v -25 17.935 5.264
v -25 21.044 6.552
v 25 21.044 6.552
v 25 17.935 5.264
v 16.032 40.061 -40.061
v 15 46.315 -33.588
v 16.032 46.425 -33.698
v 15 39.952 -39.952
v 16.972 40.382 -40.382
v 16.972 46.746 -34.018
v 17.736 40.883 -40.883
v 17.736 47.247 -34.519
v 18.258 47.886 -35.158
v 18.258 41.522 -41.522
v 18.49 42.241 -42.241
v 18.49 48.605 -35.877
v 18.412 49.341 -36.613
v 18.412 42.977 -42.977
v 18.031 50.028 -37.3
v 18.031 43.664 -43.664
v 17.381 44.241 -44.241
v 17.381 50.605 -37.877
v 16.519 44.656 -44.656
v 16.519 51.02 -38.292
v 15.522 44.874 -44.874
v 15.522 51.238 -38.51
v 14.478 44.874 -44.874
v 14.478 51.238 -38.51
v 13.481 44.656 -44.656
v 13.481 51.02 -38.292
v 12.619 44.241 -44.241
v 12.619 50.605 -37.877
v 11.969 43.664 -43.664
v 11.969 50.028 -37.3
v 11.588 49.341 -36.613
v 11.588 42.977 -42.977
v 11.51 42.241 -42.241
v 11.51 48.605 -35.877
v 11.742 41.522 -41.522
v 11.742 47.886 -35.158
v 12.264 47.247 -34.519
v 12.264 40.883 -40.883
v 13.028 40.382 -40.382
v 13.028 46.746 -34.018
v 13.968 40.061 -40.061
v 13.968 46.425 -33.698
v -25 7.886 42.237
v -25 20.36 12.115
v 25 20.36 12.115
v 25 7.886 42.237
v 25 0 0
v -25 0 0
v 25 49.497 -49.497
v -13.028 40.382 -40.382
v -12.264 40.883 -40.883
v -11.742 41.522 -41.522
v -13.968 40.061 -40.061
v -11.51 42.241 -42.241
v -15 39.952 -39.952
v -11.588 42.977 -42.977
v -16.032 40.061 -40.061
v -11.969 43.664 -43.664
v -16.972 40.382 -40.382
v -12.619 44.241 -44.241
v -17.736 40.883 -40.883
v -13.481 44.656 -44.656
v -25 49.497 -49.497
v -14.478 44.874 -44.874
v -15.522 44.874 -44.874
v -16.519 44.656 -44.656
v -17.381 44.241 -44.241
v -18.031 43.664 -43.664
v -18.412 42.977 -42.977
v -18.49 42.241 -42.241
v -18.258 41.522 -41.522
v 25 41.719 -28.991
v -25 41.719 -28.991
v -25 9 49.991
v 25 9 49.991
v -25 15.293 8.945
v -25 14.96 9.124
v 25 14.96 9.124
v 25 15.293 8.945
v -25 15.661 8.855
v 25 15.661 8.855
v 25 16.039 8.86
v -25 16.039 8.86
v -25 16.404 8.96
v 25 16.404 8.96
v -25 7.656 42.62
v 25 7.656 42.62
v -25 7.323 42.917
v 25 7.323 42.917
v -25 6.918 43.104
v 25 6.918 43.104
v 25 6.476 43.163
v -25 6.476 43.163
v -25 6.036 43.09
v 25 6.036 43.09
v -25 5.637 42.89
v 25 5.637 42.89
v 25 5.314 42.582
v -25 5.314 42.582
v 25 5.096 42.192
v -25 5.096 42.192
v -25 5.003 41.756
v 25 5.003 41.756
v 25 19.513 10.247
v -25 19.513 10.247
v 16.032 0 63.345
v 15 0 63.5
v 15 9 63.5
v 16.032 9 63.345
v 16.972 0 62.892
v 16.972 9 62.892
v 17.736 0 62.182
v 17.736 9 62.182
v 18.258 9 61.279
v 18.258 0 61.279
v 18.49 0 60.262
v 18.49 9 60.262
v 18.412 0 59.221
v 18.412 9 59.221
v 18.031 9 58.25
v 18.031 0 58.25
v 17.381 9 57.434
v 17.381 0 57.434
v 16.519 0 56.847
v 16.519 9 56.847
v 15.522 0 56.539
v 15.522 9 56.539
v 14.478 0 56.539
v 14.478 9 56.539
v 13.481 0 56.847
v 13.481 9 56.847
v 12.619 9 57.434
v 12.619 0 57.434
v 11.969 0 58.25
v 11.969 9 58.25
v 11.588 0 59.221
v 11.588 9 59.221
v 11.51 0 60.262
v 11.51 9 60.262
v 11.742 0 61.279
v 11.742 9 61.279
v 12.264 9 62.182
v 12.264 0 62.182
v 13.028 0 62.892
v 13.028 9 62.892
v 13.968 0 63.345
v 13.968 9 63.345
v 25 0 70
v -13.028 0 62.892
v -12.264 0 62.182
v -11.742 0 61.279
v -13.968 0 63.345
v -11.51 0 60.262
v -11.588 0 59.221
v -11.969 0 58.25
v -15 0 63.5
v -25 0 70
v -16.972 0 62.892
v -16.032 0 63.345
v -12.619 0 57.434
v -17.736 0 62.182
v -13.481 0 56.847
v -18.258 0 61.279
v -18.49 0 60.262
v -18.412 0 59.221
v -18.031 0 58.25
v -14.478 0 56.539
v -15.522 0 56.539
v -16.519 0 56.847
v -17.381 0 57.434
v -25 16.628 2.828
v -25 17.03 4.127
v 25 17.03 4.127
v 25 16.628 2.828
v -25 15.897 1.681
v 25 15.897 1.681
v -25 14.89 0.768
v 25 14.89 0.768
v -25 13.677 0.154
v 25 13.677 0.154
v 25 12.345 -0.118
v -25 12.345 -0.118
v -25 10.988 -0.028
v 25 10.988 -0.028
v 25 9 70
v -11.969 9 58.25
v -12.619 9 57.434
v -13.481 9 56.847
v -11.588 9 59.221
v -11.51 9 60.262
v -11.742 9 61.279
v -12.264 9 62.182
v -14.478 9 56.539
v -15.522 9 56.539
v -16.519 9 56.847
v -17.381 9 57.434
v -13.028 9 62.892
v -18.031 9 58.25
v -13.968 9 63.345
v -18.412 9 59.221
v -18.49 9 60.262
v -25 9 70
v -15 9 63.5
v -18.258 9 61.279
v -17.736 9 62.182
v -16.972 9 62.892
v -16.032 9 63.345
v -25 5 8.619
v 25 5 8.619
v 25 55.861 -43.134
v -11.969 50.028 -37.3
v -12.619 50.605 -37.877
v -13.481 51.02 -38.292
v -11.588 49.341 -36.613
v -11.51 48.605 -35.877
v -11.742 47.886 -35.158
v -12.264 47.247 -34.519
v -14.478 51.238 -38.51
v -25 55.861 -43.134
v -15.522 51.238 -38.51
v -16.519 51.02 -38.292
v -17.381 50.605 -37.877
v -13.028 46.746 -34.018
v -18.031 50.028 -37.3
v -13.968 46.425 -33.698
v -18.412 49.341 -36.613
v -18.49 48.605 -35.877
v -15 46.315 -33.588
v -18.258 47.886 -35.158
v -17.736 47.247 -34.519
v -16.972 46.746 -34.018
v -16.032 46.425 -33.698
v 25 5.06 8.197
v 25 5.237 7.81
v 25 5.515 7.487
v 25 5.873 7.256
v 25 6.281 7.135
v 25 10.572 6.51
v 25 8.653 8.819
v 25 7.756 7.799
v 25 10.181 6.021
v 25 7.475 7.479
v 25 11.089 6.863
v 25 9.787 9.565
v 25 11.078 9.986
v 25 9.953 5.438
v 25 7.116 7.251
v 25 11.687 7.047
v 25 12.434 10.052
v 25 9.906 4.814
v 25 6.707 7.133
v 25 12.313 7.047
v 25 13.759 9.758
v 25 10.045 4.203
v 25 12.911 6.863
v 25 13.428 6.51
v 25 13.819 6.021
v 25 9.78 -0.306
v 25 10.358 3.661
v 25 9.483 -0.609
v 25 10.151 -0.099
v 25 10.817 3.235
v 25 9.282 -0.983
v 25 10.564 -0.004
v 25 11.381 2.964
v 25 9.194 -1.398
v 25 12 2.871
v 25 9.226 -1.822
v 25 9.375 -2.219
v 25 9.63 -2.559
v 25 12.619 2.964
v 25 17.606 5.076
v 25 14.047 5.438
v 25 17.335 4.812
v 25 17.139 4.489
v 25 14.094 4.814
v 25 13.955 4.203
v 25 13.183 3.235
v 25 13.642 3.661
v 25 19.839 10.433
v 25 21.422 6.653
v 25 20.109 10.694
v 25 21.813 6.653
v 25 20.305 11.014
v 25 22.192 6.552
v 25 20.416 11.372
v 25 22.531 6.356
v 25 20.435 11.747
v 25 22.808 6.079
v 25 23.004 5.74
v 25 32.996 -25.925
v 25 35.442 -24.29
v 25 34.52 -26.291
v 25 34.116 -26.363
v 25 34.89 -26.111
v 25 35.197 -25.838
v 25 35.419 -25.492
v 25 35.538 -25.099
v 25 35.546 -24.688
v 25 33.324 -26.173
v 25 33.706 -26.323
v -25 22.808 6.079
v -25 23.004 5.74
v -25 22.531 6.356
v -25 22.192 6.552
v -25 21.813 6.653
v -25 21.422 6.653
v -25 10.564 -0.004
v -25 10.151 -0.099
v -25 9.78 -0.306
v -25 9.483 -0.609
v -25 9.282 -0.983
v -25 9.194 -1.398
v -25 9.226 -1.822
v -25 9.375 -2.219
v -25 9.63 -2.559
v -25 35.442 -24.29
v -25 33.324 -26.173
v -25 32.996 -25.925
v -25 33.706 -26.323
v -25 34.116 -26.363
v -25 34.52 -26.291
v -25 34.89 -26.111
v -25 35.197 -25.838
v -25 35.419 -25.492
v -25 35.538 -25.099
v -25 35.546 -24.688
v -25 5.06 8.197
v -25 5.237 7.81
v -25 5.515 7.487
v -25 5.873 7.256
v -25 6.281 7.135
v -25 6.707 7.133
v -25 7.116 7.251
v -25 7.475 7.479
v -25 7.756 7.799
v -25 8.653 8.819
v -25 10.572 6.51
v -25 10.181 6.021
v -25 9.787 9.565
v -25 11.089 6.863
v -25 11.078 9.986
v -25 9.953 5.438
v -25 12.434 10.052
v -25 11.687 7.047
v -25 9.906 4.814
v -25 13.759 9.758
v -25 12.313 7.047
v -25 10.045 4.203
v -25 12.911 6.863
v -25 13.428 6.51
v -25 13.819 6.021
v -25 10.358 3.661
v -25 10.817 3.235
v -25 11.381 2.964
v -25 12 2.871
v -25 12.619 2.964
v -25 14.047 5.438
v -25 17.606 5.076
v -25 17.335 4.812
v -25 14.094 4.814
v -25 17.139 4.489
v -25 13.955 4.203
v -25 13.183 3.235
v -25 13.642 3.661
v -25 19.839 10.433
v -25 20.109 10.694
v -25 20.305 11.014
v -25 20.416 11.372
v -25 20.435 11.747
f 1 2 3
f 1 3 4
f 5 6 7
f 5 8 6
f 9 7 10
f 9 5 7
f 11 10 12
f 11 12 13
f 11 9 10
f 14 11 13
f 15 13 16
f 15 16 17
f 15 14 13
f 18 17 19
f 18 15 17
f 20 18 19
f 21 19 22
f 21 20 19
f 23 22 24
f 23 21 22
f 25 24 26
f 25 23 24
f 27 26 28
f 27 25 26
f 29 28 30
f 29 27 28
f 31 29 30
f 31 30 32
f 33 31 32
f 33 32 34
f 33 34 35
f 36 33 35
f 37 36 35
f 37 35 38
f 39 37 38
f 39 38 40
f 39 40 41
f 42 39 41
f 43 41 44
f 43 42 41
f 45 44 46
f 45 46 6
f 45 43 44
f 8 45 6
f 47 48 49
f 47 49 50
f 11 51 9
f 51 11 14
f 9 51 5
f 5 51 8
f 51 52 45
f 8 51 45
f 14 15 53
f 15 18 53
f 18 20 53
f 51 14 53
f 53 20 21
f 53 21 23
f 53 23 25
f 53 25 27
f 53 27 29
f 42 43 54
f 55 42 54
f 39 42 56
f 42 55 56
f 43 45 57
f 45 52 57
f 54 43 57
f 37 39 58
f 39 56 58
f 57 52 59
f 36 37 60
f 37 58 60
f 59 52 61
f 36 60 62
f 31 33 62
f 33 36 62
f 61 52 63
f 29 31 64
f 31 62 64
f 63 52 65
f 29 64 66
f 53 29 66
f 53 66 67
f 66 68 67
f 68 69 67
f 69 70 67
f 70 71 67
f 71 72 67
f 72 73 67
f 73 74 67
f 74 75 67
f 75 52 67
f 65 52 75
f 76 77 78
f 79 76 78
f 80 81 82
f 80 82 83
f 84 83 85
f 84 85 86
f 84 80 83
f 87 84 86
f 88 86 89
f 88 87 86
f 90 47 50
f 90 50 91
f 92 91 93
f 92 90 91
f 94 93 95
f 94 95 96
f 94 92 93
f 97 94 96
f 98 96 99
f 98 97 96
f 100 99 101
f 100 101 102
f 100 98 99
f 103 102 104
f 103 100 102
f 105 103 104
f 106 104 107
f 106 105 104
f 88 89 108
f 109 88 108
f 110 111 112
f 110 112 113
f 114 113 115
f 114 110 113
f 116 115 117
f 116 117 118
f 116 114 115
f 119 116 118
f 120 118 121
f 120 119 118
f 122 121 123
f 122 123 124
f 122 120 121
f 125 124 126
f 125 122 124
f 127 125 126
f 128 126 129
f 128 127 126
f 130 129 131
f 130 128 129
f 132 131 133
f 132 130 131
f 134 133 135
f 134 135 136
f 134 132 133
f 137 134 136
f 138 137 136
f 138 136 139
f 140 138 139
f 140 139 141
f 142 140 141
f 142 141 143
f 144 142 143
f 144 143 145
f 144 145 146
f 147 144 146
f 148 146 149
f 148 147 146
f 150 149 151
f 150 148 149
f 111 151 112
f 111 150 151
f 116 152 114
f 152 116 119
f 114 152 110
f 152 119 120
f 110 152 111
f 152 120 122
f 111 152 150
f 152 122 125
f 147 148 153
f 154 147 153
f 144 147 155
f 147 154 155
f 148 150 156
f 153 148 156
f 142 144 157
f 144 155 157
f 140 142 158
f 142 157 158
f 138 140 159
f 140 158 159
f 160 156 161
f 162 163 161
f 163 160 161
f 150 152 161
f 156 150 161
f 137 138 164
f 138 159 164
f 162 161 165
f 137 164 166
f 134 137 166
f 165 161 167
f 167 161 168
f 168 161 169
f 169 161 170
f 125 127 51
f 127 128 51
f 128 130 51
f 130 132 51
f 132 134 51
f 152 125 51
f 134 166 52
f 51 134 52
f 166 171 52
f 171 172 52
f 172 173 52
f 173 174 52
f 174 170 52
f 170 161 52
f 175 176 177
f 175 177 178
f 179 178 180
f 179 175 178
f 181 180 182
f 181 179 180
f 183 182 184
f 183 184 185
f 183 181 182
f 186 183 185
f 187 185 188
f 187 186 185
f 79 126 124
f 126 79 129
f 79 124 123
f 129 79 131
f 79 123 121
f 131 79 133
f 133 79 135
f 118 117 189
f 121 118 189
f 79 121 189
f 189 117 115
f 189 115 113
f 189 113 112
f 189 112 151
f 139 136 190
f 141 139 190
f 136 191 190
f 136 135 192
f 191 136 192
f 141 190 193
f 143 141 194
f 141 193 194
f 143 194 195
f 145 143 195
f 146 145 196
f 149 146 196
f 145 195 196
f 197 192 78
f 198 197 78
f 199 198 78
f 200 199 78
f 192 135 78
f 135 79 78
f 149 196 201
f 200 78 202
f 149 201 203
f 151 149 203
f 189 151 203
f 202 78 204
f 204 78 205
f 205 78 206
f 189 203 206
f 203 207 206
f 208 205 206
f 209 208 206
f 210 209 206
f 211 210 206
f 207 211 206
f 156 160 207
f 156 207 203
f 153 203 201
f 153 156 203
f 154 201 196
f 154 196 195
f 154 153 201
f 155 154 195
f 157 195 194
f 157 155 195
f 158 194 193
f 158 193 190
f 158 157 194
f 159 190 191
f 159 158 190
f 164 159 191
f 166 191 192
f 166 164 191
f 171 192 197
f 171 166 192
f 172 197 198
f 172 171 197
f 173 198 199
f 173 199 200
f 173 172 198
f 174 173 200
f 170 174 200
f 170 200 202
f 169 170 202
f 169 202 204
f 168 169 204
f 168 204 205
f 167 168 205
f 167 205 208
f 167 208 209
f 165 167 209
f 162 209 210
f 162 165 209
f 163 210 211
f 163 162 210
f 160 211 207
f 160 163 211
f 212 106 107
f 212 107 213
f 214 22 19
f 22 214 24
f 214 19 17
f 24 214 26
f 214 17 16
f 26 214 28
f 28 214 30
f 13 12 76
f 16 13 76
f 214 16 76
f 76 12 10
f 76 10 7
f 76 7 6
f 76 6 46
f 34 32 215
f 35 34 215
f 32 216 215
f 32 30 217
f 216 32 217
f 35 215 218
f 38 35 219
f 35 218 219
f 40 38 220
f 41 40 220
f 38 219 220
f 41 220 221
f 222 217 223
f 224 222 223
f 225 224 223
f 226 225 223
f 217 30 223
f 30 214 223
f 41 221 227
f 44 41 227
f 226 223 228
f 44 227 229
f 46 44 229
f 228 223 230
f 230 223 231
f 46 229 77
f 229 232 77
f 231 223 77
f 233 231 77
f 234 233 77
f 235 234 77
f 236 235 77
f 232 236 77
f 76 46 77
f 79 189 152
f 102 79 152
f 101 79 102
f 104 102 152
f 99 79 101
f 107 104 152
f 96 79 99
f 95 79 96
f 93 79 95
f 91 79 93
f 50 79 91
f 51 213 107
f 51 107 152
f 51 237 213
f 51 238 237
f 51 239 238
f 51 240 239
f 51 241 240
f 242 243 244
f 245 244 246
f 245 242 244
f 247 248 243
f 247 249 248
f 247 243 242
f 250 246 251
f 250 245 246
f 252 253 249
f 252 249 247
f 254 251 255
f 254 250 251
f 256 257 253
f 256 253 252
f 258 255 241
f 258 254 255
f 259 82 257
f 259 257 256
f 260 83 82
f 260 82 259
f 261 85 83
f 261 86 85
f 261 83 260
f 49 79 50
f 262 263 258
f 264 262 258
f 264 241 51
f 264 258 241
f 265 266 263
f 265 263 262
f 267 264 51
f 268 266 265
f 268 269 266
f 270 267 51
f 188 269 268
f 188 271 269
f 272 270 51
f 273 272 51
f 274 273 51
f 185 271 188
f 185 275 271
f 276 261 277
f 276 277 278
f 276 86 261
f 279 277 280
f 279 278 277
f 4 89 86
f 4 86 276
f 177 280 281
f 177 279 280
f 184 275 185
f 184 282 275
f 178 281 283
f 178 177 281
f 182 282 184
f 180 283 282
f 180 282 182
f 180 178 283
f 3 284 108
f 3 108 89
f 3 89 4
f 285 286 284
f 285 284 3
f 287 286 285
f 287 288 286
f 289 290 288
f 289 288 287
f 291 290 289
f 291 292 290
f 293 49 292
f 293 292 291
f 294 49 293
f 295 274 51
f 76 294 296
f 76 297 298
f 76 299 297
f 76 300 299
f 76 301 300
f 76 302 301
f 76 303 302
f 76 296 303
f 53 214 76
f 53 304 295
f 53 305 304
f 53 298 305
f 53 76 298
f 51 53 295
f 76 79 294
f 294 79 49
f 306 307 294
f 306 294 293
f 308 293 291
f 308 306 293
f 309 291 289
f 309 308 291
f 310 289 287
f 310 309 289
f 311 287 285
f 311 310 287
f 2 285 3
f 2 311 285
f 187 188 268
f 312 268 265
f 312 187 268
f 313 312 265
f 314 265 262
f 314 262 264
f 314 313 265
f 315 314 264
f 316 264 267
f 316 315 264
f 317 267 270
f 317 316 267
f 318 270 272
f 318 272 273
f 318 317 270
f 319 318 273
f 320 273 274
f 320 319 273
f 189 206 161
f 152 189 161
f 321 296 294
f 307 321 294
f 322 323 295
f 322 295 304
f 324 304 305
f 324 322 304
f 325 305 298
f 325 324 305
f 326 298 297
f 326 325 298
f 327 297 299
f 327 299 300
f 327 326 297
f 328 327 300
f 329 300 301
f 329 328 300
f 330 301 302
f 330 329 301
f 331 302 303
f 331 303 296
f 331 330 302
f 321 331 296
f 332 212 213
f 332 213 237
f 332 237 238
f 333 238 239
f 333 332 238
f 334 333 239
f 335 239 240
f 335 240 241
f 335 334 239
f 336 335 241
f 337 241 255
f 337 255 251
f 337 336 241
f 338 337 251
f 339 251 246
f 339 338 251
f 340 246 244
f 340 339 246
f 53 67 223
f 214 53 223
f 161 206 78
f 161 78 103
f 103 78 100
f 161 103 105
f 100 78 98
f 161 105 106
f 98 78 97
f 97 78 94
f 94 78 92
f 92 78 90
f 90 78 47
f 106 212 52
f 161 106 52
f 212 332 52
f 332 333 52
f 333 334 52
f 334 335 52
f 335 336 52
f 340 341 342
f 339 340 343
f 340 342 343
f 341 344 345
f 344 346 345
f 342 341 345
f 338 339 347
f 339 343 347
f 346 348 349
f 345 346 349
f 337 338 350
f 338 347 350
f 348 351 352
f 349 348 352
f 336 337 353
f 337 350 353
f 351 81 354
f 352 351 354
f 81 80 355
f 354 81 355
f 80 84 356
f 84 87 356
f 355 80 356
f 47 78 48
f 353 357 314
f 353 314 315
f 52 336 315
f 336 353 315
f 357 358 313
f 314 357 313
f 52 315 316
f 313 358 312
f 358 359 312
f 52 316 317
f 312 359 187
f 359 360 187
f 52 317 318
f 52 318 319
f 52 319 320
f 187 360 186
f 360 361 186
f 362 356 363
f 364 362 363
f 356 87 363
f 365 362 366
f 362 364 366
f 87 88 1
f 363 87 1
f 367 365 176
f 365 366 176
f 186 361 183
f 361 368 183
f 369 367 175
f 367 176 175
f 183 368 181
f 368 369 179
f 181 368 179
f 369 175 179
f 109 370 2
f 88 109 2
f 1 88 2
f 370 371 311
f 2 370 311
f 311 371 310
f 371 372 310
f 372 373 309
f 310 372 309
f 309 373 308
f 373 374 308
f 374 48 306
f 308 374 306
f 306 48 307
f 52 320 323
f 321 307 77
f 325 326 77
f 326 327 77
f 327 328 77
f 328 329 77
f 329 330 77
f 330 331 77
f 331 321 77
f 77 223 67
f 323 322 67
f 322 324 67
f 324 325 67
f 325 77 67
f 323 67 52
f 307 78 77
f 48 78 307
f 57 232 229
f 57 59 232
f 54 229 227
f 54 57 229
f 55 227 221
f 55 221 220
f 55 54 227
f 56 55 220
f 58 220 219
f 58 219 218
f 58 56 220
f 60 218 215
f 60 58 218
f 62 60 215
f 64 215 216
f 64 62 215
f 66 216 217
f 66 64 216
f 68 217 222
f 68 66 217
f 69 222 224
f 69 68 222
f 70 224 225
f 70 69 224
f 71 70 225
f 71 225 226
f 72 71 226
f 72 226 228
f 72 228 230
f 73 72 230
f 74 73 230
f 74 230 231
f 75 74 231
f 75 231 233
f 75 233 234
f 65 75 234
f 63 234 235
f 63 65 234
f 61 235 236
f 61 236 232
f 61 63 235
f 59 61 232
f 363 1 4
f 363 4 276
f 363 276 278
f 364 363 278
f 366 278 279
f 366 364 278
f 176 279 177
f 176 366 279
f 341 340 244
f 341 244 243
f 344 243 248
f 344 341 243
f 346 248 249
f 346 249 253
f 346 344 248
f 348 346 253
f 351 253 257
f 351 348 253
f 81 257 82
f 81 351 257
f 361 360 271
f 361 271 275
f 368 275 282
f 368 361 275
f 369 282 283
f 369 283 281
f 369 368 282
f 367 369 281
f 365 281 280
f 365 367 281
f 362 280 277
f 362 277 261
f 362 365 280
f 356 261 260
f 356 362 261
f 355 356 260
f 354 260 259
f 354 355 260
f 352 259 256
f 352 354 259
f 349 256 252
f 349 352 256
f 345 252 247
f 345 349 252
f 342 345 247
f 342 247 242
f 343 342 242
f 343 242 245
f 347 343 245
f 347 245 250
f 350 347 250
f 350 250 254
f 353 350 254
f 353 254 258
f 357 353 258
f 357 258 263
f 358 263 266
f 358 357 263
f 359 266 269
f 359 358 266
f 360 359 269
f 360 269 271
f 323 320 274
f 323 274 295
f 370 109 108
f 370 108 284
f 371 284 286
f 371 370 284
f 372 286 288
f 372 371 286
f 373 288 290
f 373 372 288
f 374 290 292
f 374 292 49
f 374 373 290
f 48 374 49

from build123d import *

# Parameters (mm, degrees)
BOSS_EXTRUDE1_DEPTH      = 25
BOSS_EXTRUDE1_DEPTH_BACK = 25
SKETCH1_R                = 2.1
SKETCH2_R                = 3.5
CUT_EXTRUDE1_DEPTH       = 9
SKETCH3_R                = 3.5
CUT_EXTRUDE2_DEPTH       = 9


with BuildPart() as part:
    # Sketch1 → Boss-Extrude1 (new, two sides: drawn at the far end of the back side and taken through both)
    with BuildSketch(Plane(origin=(0, 0, 0), x_dir=(0, 0, -1), z_dir=(1, 0, 0)).offset(-BOSS_EXTRUDE1_DEPTH_BACK)):
        Polygon((-70, 0), (0, 0), (49.497474683, 49.497474683), (43.133513652, 55.861435714), (28.991378029, 41.71930009), (-49.991379635, 9), (-70, 9), align=None)
        with Locations((-4.970562748, 12)):
            Circle(SKETCH1_R, mode=Mode.SUBTRACT)
        with BuildLine():
            Line((-6.551793043, 21.043679481), (-5.264121815, 17.934966139))
            ThreePointArc((-5.264121815, 17.934966139), (-4.812340099, 17.335290392), (-4.126543478, 17.029675086))
            ThreePointArc((-4.126543478, 17.029675086), (-0.768310337, 14.889822601), (0.028067769, 10.988222878))
            ThreePointArc((0.028067769, 10.988222878), (0.788934633, 9.368950353), (2.558913388, 9.6299812))
            Line((2.558913388, 9.6299812), (25.924897249, 32.995965061))
            ThreePointArc((25.924897249, 32.995965061), (26.111441495, 34.889980582), (24.290211928, 35.442444531))
            Line((24.290211928, 35.442444531), (-5.739998892, 23.003523928))
            ThreePointArc((-5.739998892, 23.003523928), (-6.551793043, 22.191729778), (-6.551793043, 21.043679481))
        make_face(mode=Mode.SUBTRACT)
        with BuildLine():
            Line((-41.755939666, 5.002860881), (-8.61897952, 5.000000011))
            ThreePointArc((-8.61897952, 5.000000011), (-7.181021866, 6.072446959), (-7.79931621, 7.756364052))
            ThreePointArc((-7.79931621, 7.756364052), (-9.986482643, 11.077634818), (-9.123891859, 14.959705611))
            ThreePointArc((-9.123891859, 14.959705611), (-8.855063072, 15.660739707), (-8.959639945, 16.40423241))
            Line((-8.959639945, 16.40423241), (-10.247311173, 19.512945751))
            ThreePointArc((-10.247311173, 19.512945751), (-11.013696575, 20.305047115), (-12.114513279, 20.35957911))
            Line((-12.114513279, 20.35957911), (-42.237227636, 7.885876778))
            ThreePointArc((-42.237227636, 7.885876778), (-43.142866755, 6.253009403), (-41.755939666, 5.002860881))
        make_face(mode=Mode.SUBTRACT)
    extrude(amount=BOSS_EXTRUDE1_DEPTH + BOSS_EXTRUDE1_DEPTH_BACK)

    # Sketch2 → Cut-Extrude1 (cut)
    with BuildSketch(Plane(origin=(0, 0, 0), x_dir=(1, 0, 0), z_dir=(0, 1, 0))):
        with Locations((-15, -60)):
            Circle(SKETCH2_R)
    extrude(amount=CUT_EXTRUDE1_DEPTH, mode=Mode.SUBTRACT)

    # Sketch3 → Cut-Extrude2 (cut)
    with BuildSketch(Plane(origin=(0, 0, 0), x_dir=(1, 0, 0), z_dir=(0, 1, 0))):
        with Locations((15, -60)):
            Circle(SKETCH3_R)
    extrude(amount=CUT_EXTRUDE2_DEPTH, mode=Mode.SUBTRACT)

    # Sketch4 → Cut-Revolve1 (revolve, cut)
    with BuildSketch(Plane(origin=(15, 0, 0), x_dir=(0, 0, -1), z_dir=(1, 0, 0))):
        Polygon((36.062445841, 48.790367902), (38.537319575, 51.265241636), (44.901280605, 44.901280605), (42.426406871, 42.426406871), align=None)
    revolve(axis=Axis((15, 42.426406871, -42.426406871), (0, 0.7071067811865476, 0.7071067811865476)), mode=Mode.SUBTRACT)

    # Sketch5 → Cut-Revolve2 (revolve, cut)
    with BuildSketch(Plane(origin=(-15, 0, 0), x_dir=(0, 0, -1), z_dir=(1, 0, 0))):
        Polygon((36.062445841, 48.790367902), (38.537319575, 51.265241636), (44.901280605, 44.901280605), (42.426406871, 42.426406871), align=None)
    revolve(axis=Axis((-15, 42.426406871, -42.426406871), (0, 0.7071067811865476, 0.7071067811865476)), mode=Mode.SUBTRACT)


solid = part.part
